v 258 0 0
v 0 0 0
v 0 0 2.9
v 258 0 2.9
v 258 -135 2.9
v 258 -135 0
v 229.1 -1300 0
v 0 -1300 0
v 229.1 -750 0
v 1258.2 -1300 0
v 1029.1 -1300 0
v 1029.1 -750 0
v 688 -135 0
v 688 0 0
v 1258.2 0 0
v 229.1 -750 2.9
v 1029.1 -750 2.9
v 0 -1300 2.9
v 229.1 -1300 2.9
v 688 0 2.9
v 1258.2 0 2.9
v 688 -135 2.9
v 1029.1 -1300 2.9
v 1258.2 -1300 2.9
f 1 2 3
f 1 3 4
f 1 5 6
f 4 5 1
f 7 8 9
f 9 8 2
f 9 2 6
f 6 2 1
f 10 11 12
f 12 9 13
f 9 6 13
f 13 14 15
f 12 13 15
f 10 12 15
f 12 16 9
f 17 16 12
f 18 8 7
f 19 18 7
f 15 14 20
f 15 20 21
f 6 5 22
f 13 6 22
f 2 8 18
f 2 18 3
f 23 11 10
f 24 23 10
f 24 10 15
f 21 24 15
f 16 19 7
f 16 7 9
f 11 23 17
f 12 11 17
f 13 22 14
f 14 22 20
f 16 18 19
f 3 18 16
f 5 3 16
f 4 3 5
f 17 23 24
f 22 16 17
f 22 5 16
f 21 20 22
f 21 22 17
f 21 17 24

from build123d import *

# Parameters (mm, degrees)
CROQUIS1_W              = 1258.2
CROQUIS1_H              = 1300
SALIENTE_EXTRUIR1_DEPTH = 2.9
CROQUIS2_W              = 800
CROQUIS2_H              = 550
CORTAR_EXTRUIR1_DEPTH   = 2.9
CROQUIS3_W              = 430
CROQUIS3_H              = 135
CORTAR_EXTRUIR2_DEPTH   = 10


with BuildPart() as part:
    # Croquis1 → Saliente-Extruir1 (new body)
    with BuildSketch(Plane.XY):
        with Locations((629.1, -650)):
            Rectangle(CROQUIS1_W, CROQUIS1_H)
    extrude(amount=SALIENTE_EXTRUIR1_DEPTH)

    # Croquis2 → Cortar-Extruir1 (cut)
    with BuildSketch(Plane.XY.offset(2.9)):
        with Locations((629.1, -1025)):
            Rectangle(CROQUIS2_W, CROQUIS2_H)
    extrude(amount=-CORTAR_EXTRUIR1_DEPTH, mode=Mode.SUBTRACT)

    # Croquis3 → Cortar-Extruir2 (cut)
    with BuildSketch(Plane.XY.offset(2.9)):
        with Locations((473, -67.5)):
            Rectangle(CROQUIS3_W, CROQUIS3_H)
    extrude(amount=-CORTAR_EXTRUIR2_DEPTH, mode=Mode.SUBTRACT)


solid = part.part
